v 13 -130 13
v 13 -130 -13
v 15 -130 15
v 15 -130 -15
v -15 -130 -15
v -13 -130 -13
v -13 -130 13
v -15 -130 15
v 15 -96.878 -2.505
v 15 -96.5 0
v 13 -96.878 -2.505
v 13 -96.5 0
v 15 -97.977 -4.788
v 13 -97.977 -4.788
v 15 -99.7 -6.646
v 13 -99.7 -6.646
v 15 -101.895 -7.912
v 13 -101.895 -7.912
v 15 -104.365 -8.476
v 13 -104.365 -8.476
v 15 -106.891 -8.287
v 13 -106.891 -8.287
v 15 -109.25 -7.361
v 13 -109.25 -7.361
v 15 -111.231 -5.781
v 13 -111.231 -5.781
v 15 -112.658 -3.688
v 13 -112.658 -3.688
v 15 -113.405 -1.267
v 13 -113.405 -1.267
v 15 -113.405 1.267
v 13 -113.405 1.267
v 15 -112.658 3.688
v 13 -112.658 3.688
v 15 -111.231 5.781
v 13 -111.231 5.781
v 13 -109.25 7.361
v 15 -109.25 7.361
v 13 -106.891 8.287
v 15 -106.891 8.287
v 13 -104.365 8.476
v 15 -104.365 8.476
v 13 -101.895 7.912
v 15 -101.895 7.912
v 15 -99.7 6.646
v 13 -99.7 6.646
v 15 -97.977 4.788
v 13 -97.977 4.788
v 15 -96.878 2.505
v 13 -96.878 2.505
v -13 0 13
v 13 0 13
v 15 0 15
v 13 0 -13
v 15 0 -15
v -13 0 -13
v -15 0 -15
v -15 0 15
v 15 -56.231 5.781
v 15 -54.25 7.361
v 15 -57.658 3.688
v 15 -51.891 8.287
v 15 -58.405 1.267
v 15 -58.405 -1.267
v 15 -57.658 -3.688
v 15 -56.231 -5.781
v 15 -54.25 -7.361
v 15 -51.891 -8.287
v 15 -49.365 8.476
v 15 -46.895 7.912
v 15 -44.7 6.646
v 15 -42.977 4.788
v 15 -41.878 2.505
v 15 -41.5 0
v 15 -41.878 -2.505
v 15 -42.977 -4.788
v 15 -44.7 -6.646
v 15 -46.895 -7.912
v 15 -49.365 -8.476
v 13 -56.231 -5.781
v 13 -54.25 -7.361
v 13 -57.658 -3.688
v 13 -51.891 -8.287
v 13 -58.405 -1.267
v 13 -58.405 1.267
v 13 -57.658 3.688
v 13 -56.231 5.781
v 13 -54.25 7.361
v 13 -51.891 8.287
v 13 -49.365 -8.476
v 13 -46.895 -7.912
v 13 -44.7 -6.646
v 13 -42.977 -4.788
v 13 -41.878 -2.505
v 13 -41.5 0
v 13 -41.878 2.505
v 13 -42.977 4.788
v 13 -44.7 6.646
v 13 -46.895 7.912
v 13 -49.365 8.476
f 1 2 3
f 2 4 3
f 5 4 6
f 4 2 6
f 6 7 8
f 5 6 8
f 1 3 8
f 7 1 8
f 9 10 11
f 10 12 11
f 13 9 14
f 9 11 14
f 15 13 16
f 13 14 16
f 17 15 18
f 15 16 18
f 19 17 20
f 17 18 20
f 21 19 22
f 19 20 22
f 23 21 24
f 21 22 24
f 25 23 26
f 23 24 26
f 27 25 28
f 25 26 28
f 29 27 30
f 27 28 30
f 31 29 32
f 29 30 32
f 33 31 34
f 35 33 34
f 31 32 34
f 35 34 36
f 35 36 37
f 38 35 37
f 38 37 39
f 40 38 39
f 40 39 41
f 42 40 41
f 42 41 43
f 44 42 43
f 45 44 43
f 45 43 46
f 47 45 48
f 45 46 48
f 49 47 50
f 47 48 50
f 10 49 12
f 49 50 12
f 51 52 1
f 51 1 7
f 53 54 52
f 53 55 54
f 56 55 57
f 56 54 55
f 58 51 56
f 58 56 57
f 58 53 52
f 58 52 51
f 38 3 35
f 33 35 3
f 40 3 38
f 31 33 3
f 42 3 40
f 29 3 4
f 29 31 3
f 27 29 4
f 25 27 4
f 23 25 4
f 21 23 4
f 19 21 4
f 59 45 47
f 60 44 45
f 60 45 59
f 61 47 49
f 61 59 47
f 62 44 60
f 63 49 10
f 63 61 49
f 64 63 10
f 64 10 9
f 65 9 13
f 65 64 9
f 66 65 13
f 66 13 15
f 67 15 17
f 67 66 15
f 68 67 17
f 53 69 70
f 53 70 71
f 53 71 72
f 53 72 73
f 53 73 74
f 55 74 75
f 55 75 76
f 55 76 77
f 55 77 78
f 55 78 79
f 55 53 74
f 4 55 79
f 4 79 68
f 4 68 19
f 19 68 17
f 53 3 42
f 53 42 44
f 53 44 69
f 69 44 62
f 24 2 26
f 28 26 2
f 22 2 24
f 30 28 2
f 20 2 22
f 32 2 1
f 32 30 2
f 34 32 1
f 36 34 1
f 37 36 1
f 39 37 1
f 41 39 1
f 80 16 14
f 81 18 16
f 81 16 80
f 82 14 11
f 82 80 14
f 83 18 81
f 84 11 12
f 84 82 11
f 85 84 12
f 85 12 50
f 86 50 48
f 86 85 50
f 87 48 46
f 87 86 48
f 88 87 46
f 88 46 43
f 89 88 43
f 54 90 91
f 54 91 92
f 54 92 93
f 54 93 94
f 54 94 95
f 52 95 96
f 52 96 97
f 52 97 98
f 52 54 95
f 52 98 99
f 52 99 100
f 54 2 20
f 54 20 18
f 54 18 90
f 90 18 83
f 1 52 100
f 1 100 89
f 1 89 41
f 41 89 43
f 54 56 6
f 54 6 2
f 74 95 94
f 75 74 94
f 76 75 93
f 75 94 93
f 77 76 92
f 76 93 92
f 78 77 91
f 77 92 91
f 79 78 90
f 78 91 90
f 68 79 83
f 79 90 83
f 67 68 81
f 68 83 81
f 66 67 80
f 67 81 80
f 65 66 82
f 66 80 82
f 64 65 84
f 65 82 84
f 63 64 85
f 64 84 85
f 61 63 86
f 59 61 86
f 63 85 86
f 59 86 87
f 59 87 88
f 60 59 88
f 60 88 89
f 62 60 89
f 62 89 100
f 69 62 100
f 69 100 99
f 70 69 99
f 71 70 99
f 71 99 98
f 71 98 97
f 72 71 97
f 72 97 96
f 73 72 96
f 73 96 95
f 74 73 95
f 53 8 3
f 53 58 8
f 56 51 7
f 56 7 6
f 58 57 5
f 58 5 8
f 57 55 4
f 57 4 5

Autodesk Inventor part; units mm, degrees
ref_plane "YZ Plane" through (0, 0, 0) normal (1, 0, 0) x (0, 1, 0)
ref_plane "XZ Plane" through (0, 0, 0) normal (0, 1, 0) x (-1, 0, 0)
ref_plane "XY Plane" through (0, 0, 0) normal (0, 0, 1) x (1, 0, 0)
sketch "Sketch9" plane through (0, 0, 0) normal (0, 1, 0) x (-1, 0, 0)
  line L0 (15, 15) -> (-15, 15)
  line L1 (-15, 15) -> (-15, -15)
  line L2 (-15, -15) -> (15, -15)
  line L3 (15, -15) -> (15, 15)
  line L4 (15, 15) -> (-15, -15) construction
  line L5 (-15, 15) -> (15, -15) construction
  line L6 (-13, 13) -> (13, 13)
  line L7 (13, 13) -> (13, -13)
  line L8 (13, -13) -> (-13, -13)
  line L9 (-13, -13) -> (-13, 13)
  point P0 (0, 0)
  dimension "d172" = 30
  dimension "d173" = 30
  dimension "d174" = 2
extrude "Extrusion3" add sketch "Sketch9" against normal blind 130
sketch "Sketch10" plane through (0, 0, 0) normal (1, 0, 0) x (0, 1, 0)
  line L0 (0, 15) -> (0, -15) construction
  line L1 (0, 15) -> (-130, 15) construction
  line L2 (-130, -15) -> (-130, 15) construction
  line L3 (0, -15) -> (-130, -15) construction
  line L4 (-58.5, 8.5) -> (-41.5, 8.5)
  line L5 (-41.5, 8.5) -> (-41.5, -8.5)
  line L6 (-41.5, -8.5) -> (-58.5, -8.5)
  line L7 (-58.5, -8.5) -> (-58.5, 8.5)
  line L8 (-58.5, 8.5) -> (-41.5, -8.5) construction
  line L9 (-41.5, 8.5) -> (-58.5, -8.5) construction
  line L10 (0, 0) -> (30, 0)
  circle A0 centre (-50, 0) radius 8.5
  dimension "d177" = 17
  dimension "d178" = 17
  dimension "d181" = 30
  dimension "d182" = 80
extrude "Extrusion4" cut sketch "Sketch10" along normal through all contours A0
pattern_linear "Rectangular Pattern4" count 2 spacing 55 along (0, -1, 0) of "Extrusion4"
properties part number "PRS 1200-54-01 FDS 1200 way tube 3" material "Stainless Steel"
